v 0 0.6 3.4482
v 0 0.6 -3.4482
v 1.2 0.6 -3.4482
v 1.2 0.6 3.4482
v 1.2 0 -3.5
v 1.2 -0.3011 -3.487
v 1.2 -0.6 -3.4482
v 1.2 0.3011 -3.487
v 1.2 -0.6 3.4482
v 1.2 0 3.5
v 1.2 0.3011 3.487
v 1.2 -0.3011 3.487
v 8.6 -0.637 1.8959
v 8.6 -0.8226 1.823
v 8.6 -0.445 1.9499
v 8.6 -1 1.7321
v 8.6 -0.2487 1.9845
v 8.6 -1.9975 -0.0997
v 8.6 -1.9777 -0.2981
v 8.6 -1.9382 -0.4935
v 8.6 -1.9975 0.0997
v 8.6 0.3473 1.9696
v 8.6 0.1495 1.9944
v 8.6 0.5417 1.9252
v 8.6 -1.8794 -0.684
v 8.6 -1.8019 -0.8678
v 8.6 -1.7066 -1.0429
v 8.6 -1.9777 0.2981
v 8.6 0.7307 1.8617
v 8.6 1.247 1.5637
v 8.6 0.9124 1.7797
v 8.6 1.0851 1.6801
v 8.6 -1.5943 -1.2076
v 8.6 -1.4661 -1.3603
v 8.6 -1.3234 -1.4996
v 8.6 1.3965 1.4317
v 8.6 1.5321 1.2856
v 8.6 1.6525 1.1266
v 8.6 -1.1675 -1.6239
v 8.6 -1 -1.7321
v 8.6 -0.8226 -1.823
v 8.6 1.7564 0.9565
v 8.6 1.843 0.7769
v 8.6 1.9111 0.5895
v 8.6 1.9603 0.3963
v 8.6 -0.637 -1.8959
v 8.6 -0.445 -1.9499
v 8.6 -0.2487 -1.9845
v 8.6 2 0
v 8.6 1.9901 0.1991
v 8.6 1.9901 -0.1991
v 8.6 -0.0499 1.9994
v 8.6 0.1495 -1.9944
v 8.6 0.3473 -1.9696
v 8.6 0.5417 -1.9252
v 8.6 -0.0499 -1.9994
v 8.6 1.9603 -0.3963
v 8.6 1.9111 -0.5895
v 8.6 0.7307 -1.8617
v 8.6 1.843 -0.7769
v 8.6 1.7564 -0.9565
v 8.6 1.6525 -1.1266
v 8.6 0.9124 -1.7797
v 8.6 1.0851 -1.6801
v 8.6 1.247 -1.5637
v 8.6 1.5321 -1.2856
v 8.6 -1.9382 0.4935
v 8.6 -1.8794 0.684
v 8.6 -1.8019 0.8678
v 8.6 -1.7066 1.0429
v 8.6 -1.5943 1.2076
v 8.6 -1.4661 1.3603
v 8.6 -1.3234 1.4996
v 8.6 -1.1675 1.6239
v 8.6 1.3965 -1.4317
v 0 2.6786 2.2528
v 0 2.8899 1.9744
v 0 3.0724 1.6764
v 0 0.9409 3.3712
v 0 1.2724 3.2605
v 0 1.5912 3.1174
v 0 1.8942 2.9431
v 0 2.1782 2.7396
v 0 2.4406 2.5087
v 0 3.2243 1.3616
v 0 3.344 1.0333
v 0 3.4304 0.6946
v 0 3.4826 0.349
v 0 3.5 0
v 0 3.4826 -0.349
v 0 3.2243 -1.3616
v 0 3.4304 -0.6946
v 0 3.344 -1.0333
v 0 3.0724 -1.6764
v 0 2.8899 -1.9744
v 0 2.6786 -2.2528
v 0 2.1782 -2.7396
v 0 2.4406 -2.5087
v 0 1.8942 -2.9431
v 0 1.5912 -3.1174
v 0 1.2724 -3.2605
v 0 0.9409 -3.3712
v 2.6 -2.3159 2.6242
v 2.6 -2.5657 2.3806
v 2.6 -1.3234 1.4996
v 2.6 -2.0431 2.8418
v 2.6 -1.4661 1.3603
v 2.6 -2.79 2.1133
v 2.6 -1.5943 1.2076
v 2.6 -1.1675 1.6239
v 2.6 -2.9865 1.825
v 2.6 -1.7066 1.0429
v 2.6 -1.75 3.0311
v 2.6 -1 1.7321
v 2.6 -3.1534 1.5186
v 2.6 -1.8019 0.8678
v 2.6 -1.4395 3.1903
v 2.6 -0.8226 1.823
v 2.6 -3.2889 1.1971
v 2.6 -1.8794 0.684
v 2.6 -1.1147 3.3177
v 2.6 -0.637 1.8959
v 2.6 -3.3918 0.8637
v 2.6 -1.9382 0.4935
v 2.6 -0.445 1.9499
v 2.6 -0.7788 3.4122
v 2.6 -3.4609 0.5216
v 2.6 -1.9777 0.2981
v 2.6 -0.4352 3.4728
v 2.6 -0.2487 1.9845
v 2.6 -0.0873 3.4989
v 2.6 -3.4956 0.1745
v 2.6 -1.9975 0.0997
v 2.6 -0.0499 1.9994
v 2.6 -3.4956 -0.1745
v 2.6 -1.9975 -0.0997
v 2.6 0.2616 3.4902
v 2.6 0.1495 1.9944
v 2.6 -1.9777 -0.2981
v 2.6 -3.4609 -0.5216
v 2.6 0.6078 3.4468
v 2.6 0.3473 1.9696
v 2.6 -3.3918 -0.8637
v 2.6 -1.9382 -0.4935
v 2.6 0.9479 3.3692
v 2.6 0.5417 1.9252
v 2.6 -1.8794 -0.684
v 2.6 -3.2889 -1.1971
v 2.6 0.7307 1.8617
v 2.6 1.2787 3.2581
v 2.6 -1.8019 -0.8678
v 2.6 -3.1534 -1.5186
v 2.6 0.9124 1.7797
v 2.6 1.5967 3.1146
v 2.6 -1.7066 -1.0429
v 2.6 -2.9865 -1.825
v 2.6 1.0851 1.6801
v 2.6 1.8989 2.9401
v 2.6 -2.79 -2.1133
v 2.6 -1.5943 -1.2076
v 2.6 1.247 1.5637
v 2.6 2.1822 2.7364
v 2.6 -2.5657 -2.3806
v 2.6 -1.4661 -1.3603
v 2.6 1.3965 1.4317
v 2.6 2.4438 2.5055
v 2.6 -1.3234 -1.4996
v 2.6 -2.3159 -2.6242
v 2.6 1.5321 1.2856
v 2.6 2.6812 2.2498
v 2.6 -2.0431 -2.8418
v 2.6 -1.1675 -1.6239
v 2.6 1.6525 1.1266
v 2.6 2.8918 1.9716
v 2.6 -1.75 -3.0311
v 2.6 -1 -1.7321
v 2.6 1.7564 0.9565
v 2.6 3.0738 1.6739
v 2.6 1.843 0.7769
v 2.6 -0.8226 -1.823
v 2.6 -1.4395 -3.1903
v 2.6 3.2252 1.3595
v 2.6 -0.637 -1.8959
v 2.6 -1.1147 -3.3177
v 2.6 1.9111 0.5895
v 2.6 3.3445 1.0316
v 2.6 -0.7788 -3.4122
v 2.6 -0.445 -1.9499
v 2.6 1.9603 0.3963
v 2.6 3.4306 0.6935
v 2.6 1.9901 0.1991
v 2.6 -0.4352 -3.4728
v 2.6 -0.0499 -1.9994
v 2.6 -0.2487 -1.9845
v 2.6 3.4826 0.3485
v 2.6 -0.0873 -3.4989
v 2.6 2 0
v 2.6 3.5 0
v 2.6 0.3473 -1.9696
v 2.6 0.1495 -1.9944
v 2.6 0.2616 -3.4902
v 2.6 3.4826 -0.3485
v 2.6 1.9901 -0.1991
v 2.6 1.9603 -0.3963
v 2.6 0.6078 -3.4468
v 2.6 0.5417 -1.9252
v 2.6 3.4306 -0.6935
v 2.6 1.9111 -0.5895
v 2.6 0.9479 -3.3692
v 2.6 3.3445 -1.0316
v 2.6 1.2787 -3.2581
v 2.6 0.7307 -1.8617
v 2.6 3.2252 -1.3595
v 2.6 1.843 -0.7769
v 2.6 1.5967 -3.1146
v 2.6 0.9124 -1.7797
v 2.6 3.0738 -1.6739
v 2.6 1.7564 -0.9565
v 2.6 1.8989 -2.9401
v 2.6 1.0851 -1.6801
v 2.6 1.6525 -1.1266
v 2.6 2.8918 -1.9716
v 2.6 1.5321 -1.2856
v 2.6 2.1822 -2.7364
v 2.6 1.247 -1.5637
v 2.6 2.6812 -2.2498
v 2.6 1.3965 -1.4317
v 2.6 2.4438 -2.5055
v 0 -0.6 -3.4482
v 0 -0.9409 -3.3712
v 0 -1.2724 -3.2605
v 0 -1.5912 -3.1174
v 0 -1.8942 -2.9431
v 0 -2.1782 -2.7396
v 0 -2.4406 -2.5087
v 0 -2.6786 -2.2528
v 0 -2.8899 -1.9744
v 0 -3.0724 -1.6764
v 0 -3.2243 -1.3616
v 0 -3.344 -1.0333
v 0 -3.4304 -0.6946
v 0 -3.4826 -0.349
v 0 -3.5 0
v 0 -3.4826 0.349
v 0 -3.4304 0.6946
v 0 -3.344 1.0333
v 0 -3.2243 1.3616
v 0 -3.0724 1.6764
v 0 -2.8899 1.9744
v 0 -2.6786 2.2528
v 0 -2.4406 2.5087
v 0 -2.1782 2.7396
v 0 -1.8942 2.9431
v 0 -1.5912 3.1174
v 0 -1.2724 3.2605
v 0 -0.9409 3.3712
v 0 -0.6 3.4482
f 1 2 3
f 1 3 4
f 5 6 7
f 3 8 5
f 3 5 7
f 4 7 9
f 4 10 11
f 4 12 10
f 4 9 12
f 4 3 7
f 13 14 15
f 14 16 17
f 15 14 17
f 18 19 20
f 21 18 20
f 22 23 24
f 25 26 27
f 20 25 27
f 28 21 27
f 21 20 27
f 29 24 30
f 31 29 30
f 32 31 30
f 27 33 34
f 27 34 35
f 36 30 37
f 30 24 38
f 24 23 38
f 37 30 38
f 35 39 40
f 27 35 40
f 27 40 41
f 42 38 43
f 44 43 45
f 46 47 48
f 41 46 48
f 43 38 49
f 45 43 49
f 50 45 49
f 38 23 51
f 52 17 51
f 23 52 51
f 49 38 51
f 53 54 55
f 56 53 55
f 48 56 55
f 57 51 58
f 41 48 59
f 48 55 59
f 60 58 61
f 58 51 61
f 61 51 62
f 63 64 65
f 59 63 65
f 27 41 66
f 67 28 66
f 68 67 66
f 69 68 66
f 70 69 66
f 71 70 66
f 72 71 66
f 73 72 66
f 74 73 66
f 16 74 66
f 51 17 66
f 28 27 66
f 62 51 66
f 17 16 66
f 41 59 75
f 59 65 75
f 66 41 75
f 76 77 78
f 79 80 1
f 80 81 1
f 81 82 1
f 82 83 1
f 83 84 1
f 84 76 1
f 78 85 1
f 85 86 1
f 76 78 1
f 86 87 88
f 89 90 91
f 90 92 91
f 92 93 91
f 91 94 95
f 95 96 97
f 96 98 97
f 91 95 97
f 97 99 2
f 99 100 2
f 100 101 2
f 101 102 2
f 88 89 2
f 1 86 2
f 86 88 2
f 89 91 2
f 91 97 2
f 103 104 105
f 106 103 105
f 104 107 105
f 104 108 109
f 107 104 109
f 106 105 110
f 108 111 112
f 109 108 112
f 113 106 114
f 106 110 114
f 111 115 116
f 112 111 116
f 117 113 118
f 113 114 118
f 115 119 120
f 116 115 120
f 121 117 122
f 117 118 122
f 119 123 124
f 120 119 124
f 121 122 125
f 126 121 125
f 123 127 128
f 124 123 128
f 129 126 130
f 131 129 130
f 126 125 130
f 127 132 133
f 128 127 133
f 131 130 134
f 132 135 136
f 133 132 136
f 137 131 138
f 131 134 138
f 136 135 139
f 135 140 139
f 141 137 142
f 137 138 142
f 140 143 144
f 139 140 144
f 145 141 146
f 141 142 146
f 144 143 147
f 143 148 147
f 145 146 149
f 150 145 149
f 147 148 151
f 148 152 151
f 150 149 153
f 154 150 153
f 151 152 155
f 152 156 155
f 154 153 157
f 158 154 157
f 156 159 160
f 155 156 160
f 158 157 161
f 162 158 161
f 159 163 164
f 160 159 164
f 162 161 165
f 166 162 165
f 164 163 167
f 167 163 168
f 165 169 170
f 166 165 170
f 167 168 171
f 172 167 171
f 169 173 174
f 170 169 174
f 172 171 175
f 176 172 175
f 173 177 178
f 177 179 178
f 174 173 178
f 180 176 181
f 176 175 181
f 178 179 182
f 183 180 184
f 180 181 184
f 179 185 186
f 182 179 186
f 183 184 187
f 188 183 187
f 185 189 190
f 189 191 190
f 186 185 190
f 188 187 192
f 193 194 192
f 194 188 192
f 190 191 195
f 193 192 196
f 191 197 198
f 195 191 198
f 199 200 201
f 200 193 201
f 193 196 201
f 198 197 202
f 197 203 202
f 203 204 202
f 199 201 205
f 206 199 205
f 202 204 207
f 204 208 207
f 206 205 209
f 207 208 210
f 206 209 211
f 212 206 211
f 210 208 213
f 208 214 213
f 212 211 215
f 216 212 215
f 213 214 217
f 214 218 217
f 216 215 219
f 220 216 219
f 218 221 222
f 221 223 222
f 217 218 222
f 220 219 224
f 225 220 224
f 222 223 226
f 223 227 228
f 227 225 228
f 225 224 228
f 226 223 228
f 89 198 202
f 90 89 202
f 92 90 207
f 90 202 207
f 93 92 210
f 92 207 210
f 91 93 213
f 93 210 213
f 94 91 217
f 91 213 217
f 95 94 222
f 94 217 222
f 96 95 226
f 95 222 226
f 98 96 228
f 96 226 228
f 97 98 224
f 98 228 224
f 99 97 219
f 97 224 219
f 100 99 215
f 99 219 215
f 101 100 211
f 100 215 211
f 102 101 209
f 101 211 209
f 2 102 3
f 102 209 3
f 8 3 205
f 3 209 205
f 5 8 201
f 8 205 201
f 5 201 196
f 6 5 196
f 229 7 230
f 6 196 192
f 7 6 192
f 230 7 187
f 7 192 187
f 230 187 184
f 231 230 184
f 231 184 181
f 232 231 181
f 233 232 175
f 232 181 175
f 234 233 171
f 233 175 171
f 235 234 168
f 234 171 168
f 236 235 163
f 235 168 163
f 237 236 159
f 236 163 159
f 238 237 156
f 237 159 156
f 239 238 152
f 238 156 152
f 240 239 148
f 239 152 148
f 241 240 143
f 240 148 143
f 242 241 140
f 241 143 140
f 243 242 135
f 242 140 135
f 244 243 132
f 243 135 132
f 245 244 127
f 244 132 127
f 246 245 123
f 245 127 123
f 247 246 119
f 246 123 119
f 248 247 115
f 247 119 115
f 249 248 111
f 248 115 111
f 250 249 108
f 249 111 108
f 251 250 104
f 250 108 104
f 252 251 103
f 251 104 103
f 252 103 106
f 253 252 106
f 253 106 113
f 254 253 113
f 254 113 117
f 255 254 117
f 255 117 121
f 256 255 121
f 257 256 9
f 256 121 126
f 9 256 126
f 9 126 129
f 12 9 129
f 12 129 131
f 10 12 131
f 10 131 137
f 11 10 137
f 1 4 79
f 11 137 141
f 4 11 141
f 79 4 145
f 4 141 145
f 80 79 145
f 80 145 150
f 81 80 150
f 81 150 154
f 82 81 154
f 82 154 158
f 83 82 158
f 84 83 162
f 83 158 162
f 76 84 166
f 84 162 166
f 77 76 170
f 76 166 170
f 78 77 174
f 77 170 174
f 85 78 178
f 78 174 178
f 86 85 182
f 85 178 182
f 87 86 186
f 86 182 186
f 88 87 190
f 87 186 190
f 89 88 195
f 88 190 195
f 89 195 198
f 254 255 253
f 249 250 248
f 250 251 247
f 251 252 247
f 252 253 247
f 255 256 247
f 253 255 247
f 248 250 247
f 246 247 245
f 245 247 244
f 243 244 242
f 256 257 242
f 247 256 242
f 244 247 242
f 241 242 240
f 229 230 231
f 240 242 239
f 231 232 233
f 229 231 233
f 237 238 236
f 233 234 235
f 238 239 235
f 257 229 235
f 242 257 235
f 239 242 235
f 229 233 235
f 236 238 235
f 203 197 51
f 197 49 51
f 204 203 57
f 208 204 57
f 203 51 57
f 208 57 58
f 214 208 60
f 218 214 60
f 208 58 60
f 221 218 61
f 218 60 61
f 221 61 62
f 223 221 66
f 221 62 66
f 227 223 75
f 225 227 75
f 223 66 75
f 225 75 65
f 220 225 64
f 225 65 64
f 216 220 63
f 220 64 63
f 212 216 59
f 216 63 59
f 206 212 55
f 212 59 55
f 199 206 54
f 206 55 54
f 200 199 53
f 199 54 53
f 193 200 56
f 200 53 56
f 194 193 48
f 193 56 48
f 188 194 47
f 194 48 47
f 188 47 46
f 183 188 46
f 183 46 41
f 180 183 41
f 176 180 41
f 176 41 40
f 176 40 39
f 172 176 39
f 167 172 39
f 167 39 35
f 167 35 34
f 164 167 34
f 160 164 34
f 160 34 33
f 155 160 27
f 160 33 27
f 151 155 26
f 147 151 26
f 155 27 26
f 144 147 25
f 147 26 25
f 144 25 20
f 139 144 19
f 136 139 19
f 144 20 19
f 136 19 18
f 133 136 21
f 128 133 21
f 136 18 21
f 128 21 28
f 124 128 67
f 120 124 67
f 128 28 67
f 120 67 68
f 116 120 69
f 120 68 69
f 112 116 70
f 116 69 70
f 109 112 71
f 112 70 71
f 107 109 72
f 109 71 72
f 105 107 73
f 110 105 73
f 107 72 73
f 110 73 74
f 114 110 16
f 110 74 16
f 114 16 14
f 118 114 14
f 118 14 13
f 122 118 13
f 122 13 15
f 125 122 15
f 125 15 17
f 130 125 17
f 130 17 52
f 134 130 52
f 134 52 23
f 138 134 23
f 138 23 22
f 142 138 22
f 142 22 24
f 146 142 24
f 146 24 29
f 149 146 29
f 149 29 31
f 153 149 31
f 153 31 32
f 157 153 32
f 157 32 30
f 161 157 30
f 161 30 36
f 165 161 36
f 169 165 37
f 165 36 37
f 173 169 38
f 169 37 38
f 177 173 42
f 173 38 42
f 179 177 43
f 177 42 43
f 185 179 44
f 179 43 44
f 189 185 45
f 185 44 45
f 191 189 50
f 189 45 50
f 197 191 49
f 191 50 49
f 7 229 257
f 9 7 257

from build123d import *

# Parameters (mm, degrees)
SKETCH2_W          = 7
SKETCH2_H          = 1.2
CUT_EXTRUDE1_DEPTH = 1.2


with BuildPart() as part:
    # Sketch1 → Revolve1 (revolve)
    with BuildSketch(Plane.XY):
        Polygon((0, 0), (0, 3.5), (2.6, 3.5), (2.6, 2), (8.6, 2), (8.6, 0), align=None)
    revolve(axis=Axis((8.6, 0, 0), (-1, 0, 0)))

    # Sketch2 → Cut-Extrude1 (cut)
    with BuildSketch(Plane.ZY):
        Rectangle(SKETCH2_W, SKETCH2_H)
    extrude(amount=-CUT_EXTRUDE1_DEPTH, mode=Mode.SUBTRACT)


solid = part.part
